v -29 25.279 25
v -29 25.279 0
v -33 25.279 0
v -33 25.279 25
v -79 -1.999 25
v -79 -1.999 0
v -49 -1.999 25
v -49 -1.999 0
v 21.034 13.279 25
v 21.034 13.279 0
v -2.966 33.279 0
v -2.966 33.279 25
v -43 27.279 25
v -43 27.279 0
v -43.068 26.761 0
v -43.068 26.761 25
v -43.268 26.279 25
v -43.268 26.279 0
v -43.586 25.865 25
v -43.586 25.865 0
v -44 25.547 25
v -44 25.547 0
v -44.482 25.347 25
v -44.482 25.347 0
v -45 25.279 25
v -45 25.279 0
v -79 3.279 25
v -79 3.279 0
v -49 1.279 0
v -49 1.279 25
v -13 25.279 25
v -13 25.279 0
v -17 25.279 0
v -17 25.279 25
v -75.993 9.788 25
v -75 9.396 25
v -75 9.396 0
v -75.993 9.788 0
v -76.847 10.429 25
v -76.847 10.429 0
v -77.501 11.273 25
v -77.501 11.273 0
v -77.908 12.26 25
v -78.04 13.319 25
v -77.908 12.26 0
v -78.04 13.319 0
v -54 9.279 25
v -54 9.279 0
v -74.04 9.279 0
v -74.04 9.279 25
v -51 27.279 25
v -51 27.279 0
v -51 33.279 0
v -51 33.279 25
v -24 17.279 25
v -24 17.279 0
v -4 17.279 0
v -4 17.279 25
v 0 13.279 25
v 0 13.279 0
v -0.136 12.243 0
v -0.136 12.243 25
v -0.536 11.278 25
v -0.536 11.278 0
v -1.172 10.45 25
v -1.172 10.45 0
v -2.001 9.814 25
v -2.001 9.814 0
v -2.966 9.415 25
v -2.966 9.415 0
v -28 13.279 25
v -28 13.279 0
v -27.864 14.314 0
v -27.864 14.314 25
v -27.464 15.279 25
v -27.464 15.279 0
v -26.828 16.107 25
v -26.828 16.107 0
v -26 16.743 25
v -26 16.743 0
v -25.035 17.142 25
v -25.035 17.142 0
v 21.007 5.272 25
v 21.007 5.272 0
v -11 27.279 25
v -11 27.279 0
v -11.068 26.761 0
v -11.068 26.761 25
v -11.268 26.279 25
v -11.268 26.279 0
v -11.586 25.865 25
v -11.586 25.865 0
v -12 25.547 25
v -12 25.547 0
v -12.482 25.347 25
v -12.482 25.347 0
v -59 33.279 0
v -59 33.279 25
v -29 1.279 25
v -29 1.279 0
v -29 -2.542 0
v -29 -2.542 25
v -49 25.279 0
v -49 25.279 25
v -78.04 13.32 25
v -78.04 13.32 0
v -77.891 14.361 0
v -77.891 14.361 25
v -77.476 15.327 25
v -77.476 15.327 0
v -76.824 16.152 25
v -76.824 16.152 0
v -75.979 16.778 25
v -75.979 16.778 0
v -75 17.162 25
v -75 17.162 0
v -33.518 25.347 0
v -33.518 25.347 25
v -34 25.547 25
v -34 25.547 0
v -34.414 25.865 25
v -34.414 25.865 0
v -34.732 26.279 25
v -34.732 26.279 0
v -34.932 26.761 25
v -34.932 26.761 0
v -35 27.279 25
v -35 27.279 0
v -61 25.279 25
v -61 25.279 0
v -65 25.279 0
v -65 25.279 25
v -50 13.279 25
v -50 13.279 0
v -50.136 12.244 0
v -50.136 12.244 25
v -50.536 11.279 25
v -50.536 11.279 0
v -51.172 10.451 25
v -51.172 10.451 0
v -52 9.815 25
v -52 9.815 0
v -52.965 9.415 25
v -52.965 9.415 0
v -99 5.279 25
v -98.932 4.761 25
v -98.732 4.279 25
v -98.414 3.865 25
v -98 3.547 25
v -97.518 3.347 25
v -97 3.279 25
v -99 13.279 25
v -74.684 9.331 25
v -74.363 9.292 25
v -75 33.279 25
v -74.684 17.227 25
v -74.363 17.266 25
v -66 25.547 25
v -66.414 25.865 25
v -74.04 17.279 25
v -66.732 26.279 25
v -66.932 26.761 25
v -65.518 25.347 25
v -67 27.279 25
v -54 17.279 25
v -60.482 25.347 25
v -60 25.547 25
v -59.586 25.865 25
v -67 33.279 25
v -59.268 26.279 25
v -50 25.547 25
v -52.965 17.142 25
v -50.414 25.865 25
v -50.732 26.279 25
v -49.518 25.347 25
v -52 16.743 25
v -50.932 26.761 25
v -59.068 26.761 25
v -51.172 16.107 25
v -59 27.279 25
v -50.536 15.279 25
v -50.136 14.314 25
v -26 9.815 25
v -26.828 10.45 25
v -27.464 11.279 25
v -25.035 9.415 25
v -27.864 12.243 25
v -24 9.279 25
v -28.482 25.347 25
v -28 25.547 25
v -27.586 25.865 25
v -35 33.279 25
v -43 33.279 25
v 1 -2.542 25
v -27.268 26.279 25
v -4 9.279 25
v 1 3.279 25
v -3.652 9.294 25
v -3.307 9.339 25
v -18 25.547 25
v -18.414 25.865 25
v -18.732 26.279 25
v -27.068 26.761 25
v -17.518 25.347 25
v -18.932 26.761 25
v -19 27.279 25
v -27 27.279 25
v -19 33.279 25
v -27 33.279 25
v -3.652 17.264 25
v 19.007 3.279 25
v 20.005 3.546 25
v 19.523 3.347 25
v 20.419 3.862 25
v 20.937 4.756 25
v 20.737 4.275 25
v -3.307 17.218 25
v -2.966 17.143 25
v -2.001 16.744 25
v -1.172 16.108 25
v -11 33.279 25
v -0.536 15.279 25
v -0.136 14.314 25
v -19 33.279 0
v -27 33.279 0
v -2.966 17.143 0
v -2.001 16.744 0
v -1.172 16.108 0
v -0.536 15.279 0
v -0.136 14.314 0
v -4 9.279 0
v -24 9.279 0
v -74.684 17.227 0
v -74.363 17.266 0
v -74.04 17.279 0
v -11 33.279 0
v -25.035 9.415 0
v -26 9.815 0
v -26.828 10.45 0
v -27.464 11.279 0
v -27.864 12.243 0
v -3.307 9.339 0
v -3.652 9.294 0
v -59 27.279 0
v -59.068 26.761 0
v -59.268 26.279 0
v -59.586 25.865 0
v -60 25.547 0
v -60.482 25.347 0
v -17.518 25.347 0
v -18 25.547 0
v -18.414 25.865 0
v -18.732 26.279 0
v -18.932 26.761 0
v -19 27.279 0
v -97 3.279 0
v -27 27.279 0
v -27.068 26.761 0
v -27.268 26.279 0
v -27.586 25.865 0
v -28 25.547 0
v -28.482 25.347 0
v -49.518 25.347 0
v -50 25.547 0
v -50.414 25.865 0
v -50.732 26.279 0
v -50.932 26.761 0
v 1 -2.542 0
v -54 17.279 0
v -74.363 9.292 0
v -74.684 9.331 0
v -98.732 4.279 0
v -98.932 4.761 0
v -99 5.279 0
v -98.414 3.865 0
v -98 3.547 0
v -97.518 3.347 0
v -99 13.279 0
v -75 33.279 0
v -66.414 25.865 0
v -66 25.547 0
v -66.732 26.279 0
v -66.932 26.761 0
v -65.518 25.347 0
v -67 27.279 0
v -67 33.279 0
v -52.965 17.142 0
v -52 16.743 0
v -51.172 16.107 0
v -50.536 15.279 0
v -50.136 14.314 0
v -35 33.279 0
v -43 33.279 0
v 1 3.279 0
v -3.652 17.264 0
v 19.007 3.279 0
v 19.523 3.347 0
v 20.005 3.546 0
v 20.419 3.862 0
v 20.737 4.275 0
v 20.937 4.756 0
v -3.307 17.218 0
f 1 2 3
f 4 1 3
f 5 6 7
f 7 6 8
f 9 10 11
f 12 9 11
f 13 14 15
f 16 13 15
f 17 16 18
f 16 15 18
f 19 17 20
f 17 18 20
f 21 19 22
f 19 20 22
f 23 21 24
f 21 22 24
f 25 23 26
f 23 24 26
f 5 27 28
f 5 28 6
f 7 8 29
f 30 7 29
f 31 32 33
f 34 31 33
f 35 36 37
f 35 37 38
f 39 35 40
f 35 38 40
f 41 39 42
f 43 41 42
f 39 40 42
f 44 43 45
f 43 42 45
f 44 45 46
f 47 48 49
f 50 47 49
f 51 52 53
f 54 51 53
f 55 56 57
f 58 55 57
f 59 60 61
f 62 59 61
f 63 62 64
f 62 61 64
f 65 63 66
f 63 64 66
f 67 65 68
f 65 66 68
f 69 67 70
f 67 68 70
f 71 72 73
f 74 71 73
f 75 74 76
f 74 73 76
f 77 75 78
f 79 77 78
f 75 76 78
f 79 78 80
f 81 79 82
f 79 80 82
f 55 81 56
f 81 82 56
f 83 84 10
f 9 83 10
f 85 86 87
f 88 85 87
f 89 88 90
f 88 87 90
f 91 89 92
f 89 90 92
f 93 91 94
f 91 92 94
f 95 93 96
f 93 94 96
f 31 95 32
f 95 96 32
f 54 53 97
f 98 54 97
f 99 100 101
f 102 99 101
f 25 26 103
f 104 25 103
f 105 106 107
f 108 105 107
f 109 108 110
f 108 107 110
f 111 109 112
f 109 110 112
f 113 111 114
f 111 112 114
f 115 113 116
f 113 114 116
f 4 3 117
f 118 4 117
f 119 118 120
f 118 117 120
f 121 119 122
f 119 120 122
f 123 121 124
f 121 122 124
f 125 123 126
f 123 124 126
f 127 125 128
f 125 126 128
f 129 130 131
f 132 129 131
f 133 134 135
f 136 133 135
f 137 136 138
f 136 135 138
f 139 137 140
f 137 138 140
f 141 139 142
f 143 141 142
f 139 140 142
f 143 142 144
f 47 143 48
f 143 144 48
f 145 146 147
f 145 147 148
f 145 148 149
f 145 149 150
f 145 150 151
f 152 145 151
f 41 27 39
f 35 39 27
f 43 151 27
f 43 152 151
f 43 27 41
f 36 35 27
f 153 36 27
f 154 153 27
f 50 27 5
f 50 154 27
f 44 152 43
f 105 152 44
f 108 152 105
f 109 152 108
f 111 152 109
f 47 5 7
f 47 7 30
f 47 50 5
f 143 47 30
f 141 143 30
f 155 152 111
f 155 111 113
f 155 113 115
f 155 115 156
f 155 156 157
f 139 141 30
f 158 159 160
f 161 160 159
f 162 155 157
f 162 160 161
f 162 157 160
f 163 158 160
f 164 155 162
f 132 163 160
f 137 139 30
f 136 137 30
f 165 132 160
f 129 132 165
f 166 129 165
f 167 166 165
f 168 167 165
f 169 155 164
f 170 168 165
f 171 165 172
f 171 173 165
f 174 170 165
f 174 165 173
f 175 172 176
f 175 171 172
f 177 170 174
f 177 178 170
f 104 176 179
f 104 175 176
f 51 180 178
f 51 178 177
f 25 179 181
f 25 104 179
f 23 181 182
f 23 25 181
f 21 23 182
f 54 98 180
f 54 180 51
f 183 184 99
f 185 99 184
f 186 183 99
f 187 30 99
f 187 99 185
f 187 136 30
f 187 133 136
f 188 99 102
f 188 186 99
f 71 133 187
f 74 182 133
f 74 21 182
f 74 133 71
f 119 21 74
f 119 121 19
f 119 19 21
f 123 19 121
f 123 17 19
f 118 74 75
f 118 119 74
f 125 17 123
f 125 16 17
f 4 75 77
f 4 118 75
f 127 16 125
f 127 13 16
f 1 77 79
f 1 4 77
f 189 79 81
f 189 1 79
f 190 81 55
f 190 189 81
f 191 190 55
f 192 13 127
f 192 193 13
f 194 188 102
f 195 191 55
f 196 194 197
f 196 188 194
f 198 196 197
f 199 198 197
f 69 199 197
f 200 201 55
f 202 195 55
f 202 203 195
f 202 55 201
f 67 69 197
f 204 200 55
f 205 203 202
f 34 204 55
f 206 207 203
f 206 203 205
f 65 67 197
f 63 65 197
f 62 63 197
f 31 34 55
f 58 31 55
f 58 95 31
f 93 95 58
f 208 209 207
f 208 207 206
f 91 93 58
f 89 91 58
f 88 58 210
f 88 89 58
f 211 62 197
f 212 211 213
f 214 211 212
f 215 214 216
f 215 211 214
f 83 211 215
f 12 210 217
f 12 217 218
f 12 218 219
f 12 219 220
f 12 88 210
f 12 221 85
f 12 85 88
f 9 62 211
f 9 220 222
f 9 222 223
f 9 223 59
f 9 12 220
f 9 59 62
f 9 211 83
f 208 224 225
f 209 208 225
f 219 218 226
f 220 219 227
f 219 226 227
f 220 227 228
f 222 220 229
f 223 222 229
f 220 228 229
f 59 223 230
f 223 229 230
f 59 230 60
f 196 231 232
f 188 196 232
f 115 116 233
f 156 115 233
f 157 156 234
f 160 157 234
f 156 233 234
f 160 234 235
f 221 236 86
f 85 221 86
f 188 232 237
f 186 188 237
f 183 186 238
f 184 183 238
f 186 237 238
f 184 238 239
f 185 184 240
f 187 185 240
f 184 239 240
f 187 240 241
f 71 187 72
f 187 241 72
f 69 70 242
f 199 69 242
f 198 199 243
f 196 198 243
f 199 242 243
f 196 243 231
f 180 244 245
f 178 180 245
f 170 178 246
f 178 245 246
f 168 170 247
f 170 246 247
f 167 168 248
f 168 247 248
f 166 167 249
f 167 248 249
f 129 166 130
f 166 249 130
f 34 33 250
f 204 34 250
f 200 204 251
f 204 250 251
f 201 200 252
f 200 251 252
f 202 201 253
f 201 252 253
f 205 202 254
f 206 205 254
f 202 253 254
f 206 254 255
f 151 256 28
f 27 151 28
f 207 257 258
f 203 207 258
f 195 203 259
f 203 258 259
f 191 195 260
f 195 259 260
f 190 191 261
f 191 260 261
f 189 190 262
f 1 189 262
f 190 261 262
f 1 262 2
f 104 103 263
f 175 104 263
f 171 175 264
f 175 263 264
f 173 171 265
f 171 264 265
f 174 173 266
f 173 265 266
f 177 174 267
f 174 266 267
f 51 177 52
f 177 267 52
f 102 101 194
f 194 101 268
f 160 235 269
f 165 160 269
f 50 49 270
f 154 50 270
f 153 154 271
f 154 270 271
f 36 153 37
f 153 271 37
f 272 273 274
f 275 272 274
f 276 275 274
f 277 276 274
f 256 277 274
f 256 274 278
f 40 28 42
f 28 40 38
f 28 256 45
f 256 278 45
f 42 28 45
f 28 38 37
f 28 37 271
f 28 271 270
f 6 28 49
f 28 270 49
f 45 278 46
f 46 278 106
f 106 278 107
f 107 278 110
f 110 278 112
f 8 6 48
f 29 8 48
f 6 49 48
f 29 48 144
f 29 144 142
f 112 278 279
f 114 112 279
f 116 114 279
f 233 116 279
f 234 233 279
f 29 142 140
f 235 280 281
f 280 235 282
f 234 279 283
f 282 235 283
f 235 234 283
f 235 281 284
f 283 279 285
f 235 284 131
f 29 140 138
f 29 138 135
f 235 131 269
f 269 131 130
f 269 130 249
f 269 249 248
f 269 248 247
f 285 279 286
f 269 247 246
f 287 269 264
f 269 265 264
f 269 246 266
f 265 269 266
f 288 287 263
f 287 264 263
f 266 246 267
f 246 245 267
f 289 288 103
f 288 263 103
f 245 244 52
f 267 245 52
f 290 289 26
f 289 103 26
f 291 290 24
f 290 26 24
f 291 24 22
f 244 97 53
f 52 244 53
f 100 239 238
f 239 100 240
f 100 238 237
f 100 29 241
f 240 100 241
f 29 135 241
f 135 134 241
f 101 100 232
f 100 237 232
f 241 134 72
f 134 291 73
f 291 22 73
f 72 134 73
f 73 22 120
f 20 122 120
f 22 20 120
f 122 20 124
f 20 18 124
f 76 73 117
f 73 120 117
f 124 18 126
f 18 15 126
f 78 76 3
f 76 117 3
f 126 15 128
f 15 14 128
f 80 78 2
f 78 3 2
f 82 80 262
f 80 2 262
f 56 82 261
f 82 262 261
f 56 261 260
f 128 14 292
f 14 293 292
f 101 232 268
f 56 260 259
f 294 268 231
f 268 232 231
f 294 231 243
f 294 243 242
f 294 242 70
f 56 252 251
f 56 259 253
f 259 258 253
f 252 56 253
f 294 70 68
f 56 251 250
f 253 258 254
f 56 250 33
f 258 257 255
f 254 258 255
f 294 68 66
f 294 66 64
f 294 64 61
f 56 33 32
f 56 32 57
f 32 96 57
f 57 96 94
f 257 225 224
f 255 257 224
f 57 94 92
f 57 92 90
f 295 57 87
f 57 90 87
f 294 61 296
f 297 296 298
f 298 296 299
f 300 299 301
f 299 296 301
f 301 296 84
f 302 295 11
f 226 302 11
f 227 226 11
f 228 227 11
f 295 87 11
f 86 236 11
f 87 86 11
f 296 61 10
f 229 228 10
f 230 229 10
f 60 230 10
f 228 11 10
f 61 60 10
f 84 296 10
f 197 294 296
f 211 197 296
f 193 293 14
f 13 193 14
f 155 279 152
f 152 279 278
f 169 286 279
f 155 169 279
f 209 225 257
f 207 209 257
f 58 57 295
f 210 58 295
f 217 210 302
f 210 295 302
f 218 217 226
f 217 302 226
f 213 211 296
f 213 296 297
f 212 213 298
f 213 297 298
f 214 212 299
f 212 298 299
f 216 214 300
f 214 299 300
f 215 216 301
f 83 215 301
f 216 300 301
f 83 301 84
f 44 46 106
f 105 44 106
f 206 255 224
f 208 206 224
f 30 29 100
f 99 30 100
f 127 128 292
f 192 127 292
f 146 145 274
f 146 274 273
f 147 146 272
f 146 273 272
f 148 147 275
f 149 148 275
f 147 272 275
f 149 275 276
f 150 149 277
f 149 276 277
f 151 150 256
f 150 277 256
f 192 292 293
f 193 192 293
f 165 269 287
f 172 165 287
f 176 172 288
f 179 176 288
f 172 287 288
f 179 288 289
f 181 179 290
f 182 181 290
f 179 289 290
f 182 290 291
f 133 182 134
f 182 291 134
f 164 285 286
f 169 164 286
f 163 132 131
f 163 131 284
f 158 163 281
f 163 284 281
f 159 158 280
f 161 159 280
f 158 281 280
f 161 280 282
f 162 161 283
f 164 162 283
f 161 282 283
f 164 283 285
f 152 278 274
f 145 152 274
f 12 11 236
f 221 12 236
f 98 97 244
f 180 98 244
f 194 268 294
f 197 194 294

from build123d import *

# Parameters (mm, degrees)
F1_DEPTH = 25


with BuildPart() as f1:
    # F0 (on Top) → F1 (new body)
    with BuildSketch(Plane.XY):
        with BuildLine():
            Line((-75, 17.161901), (-75, 33.278717))
            Line((-75, 33.278717), (-99, 13.278717))
            Line((-99, 13.278717), (-99, 5.278717))
            ThreePointArc((-99, 5.278717), (-98.414214, 3.864503), (-97, 3.278717))
            Line((-97, 3.278717), (-79, 3.278717))
            Line((-79, 3.278717), (-79, -1.999241))
            Line((-79, -1.999241), (-75, -1.999241))
            Line((-75, -1.999241), (-75, 9.395945))
            ThreePointArc((-75, 9.395945), (-77.202197, 10.829057), (-78.040169, 13.319295))
            Line((-78.040169, 13.319295), (-78.040164, 13.319706))
            ThreePointArc((-78.040164, 13.319706), (-77.177183, 15.760739), (-75, 17.161901))
        make_face()
        with BuildLine():
            Line((-67, 33.278717), (-75, 33.278717))
            Line((-75, 33.278717), (-75, 17.161901))
            ThreePointArc((-75, 17.161901), (-74.523729, 17.249405), (-74.040374, 17.278717))
            Line((-74.040374, 17.278717), (-54, 17.278717))
            ThreePointArc((-54, 17.278717), (-51.171718, 16.107289), (-50, 13.279128))
            Line((-50, 13.279128), (-50, 13.278717))
            ThreePointArc((-50, 13.278717), (-51.171718, 10.450556), (-54, 9.279128))
            Line((-54, 9.279128), (-74.04037, 9.279128))
            ThreePointArc((-74.04037, 9.279128), (-74.523727, 9.30844), (-75, 9.395945))
            Line((-75, 9.395945), (-75, -1.999241))
            Line((-75, -1.999241), (-49, -1.999241))
            Line((-49, -1.999241), (-49, 1.278717))
            Line((-49, 1.278717), (-39, 1.278717))
            Line((-39, 1.278717), (-29, 1.278717))
            Line((-29, 1.278717), (-29, -2.541677))
            Line((-29, -2.541677), (-2.966445, -2.541677))
            Line((-2.966445, -2.541677), (-2.966445, 9.414552))
            ThreePointArc((-2.966445, 9.414552), (-3.478779, 9.312821), (-4, 9.278717))
            Line((-4, 9.278717), (-24, 9.278717))
            ThreePointArc((-24, 9.278717), (-26.828427, 10.450289), (-28, 13.278717))
            ThreePointArc((-28, 13.278717), (-26.828427, 16.107144), (-24, 17.278717))
            Line((-24, 17.278717), (-4, 17.278717))
            ThreePointArc((-4, 17.278717), (-3.478779, 17.244612), (-2.966445, 17.142881))
            Line((-2.966445, 17.142881), (-2.966445, 33.278717))
            Line((-2.966445, 33.278717), (-11, 33.278717))
            Line((-11, 33.278717), (-11, 27.278717))
            ThreePointArc((-11, 27.278717), (-11.585786, 25.864503), (-13, 25.278717))
            Line((-13, 25.278717), (-17, 25.278717))
            ThreePointArc((-17, 25.278717), (-18.414214, 25.864503), (-19, 27.278717))
            Line((-19, 27.278717), (-19, 33.278717))
            Line((-19, 33.278717), (-27, 33.278717))
            Line((-27, 33.278717), (-27, 27.278717))
            ThreePointArc((-27, 27.278717), (-27.585786, 25.864503), (-29, 25.278717))
            Line((-29, 25.278717), (-33, 25.278717))
            ThreePointArc((-33, 25.278717), (-34.414214, 25.864503), (-35, 27.278717))
            Line((-35, 27.278717), (-35, 33.278717))
            Line((-35, 33.278717), (-43, 33.278717))
            Line((-43, 33.278717), (-43, 27.278717))
            ThreePointArc((-43, 27.278717), (-43.585786, 25.864503), (-45, 25.278717))
            Line((-45, 25.278717), (-49, 25.278717))
            ThreePointArc((-49, 25.278717), (-50.414214, 25.864503), (-51, 27.278717))
            Line((-51, 27.278717), (-51, 33.278717))
            Line((-51, 33.278717), (-59, 33.278717))
            Line((-59, 33.278717), (-59, 27.278717))
            ThreePointArc((-59, 27.278717), (-59.585786, 25.864503), (-61, 25.278717))
            Line((-61, 25.278717), (-65, 25.278717))
            ThreePointArc((-65, 25.278717), (-66.414214, 25.864503), (-67, 27.278717))
            Line((-67, 27.278717), (-67, 33.278717))
        make_face()
        with BuildLine():
            Line((-2.966445, 9.414552), (-2.966445, -2.541677))
            Line((-2.966445, -2.541677), (1, -2.541677))
            Line((1, -2.541677), (1, 3.278773))
            Line((1, 3.278773), (19.0067, 3.278773))
            ThreePointArc((19.0067, 3.278773), (20.418539, 3.862189), (21.006688, 5.272062))
            Line((21.006688, 5.272062), (21.033555, 13.278717))
            Line((21.033555, 13.278717), (-2.966445, 33.278717))
            Line((-2.966445, 33.278717), (-2.966445, 17.142881))
            ThreePointArc((-2.966445, 17.142881), (-0.827129, 15.714469), (0, 13.278717))
            ThreePointArc((0, 13.278717), (-0.827129, 10.842964), (-2.966445, 9.414552))
        make_face()
    extrude(amount=F1_DEPTH)


solid = f1.part
